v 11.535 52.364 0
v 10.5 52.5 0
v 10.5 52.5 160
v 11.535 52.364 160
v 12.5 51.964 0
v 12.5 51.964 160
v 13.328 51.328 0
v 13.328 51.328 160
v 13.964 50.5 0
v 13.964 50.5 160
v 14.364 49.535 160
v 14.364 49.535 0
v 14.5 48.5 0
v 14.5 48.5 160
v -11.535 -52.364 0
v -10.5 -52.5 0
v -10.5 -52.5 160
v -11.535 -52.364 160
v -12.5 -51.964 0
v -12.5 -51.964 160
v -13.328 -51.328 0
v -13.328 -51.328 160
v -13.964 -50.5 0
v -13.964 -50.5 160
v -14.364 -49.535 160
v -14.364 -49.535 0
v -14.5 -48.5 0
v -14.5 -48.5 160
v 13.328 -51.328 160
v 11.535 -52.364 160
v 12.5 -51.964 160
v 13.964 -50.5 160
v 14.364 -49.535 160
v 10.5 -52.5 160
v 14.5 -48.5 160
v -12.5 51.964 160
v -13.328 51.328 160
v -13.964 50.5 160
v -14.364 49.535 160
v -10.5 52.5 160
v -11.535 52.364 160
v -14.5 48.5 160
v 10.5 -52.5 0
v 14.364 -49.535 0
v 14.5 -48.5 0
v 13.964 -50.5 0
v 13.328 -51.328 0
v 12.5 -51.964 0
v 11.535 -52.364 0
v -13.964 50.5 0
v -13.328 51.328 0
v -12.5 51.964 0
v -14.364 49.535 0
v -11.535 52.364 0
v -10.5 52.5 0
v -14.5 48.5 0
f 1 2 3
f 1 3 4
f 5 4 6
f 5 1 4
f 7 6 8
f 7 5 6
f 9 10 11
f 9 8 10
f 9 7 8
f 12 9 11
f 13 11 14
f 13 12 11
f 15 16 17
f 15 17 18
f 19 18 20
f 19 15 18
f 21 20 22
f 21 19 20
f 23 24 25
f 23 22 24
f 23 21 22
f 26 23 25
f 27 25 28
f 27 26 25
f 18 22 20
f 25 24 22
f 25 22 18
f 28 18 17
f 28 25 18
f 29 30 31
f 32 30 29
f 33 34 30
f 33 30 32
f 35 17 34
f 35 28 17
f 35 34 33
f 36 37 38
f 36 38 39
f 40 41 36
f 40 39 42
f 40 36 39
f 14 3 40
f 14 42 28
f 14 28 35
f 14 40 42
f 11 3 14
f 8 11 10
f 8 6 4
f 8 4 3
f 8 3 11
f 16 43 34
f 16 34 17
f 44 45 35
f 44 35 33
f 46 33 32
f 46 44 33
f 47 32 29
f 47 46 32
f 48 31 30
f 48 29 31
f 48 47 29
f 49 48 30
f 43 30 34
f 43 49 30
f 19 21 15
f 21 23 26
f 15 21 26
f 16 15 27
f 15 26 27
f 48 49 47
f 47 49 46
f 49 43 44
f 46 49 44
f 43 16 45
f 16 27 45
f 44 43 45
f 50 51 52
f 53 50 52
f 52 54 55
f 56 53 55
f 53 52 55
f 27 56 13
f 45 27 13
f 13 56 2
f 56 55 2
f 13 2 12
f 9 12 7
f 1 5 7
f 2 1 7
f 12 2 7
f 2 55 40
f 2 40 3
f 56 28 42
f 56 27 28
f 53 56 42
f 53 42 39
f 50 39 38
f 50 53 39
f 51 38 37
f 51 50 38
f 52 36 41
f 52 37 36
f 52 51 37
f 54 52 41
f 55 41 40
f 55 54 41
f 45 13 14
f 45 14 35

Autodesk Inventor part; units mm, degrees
ref_plane "YZ Plane" through (0, 0, 0) normal (1, 0, 0) x (0, 1, 0)
ref_plane "XZ Plane" through (0, 0, 0) normal (0, 1, 0) x (-1, 0, 0)
ref_plane "XY Plane" through (0, 0, 0) normal (0, 0, 1) x (1, 0, 0)
sketch "Sketch1" plane through (0, 0, 0) normal (0, 0, 1) x (1, 0, 0)
  line L0 (-10.5, 52.5) -> (10.5, 52.5)
  line L1 (14.5, 48.5) -> (14.5, -48.5)
  line L2 (10.5, -52.5) -> (-10.5, -52.5)
  line L3 (-14.5, -48.5) -> (-14.5, 48.5)
  line L4 (-14.5, 52.5) -> (14.5, -52.5) construction
  line L5 (14.5, 52.5) -> (-14.5, -52.5) construction
  arc A0 (14.5, 48.5) -> (10.5, 52.5) centre (10.5, 48.5) ccw
  arc A1 (-10.5, 52.5) -> (-14.5, 48.5) centre (-10.5, 48.5) ccw
  arc A2 (-14.5, -48.5) -> (-10.5, -52.5) centre (-10.5, -48.5) ccw
  arc A3 (10.5, -52.5) -> (14.5, -48.5) centre (10.5, -48.5) ccw
  point P0 (0, 0)
  dimension "d0" = 29
  dimension "d1" = 105
  dimension "d2" = 4
extrude "Extrusion1" add sketch "Sketch1" along normal blind 160
properties part number "USRPB210"
